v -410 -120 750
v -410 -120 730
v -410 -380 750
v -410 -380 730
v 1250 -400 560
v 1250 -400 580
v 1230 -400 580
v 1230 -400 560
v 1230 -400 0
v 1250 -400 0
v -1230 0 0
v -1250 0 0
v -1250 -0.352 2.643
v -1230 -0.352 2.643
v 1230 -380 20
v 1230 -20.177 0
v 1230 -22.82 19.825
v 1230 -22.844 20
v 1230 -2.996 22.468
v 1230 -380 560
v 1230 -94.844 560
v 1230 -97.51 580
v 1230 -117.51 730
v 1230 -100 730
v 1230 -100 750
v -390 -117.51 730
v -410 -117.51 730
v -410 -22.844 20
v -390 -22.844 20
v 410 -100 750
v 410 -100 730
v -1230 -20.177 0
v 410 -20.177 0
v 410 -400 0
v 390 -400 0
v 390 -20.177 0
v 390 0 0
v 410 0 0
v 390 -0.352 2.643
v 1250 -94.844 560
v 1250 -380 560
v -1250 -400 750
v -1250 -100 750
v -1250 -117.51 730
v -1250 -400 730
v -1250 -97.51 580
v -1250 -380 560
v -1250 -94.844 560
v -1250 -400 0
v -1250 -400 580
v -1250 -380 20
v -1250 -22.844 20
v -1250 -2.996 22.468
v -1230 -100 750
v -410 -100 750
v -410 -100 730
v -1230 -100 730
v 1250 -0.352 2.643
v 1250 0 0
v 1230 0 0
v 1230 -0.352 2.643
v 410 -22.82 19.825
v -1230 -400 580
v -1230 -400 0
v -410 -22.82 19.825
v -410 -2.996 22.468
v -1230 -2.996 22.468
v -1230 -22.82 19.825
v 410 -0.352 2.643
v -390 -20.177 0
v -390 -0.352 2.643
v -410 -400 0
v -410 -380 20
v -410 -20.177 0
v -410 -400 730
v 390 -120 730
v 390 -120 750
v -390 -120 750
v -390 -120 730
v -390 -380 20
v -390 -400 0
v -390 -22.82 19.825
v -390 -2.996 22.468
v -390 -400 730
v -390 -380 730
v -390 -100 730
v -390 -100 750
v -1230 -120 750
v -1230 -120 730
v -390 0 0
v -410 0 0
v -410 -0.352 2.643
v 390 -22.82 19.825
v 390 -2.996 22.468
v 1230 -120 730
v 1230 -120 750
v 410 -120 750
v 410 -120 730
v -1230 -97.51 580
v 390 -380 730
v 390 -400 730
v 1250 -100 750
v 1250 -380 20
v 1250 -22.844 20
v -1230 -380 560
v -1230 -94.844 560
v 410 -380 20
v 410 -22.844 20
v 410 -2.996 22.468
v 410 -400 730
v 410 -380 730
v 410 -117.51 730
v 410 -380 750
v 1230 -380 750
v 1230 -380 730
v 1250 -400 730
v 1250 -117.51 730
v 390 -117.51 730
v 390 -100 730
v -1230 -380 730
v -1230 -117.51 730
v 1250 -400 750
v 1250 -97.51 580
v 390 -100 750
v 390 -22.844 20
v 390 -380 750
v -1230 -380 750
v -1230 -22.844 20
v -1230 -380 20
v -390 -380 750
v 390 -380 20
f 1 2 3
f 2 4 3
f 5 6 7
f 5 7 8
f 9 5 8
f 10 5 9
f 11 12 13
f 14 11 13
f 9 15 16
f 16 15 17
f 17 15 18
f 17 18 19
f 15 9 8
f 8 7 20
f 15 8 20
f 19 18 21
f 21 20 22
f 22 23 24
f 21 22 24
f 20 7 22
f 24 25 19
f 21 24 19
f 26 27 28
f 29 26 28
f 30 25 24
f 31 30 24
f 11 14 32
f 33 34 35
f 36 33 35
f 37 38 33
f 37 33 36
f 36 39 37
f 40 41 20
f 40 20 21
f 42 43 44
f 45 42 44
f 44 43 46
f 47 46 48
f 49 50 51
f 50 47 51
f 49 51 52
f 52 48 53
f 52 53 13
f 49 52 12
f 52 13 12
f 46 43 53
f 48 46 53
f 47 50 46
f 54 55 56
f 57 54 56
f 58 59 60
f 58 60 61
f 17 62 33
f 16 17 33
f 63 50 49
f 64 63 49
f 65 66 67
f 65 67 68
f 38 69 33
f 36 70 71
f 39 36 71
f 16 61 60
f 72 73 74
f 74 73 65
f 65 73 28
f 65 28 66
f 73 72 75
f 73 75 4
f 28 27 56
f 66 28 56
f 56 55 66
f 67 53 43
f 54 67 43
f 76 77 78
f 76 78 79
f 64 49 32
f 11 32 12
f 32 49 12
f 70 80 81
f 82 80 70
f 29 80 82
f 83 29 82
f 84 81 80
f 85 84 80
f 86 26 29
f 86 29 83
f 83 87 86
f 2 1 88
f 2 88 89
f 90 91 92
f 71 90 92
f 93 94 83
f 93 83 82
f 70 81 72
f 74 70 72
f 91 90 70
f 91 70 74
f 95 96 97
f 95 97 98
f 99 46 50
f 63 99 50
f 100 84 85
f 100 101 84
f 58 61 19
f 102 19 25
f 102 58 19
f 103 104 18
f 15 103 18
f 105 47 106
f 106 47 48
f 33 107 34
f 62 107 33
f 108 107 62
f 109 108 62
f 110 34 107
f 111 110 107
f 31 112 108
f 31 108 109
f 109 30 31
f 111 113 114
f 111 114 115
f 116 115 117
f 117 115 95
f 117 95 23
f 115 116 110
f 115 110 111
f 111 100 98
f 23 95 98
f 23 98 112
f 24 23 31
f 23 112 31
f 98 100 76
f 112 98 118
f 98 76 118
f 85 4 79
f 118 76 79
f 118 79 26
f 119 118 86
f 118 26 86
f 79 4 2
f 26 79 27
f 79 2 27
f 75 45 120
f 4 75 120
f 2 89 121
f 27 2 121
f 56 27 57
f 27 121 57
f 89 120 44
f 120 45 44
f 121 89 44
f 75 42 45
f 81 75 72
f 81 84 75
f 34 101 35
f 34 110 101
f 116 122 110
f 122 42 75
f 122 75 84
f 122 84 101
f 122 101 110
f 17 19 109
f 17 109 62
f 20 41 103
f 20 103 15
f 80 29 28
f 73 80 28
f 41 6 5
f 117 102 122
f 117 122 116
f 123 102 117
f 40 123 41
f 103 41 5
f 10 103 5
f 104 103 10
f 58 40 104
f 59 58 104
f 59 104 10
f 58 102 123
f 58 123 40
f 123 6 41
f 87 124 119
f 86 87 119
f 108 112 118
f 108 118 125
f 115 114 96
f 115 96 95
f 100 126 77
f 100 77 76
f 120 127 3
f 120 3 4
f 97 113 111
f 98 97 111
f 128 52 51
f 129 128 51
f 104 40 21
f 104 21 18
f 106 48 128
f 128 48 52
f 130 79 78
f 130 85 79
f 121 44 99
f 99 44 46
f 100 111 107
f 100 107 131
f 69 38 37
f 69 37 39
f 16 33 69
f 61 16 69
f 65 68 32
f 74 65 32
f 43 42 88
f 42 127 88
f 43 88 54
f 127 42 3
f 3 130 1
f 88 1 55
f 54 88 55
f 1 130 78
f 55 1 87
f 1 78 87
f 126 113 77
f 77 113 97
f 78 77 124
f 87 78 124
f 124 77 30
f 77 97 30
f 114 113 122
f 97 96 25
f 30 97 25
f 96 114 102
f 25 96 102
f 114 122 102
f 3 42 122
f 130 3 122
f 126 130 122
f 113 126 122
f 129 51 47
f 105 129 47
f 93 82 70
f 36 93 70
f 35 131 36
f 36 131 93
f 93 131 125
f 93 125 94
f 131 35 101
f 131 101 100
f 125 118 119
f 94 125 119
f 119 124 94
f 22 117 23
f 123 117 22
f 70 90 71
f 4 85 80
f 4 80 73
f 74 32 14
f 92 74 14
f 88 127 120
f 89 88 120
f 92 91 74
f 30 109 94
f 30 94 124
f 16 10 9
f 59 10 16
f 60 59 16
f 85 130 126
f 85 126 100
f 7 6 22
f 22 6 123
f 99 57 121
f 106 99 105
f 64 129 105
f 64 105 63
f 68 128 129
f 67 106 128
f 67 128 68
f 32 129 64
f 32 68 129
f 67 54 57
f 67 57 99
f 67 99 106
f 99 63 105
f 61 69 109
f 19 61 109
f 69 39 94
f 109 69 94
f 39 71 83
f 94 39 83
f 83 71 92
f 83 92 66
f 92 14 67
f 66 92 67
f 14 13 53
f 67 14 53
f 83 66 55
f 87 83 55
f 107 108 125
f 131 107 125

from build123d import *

# Parameters (mm, degrees)
BOSS_EXTRUDE2_START  = 1250
BOSS_EXTRUDE2_DEPTH  = 20
SKETCH3_W            = 20
SKETCH3_H            = 20
BOSS_EXTRUDE3_DEPTH  = 1250
LPATTERN1_COUNT      = 2
LPATTERN1_PITCH      = 840
MIRROR1_START        = 1250
MIRROR1_COPY_1_DEPTH = 20
SKETCH6_W            = 20
SKETCH6_H            = 20
BOSS_EXTRUDE7_DEPTH  = 730
SKETCH7_W            = 20
SKETCH7_H            = 379.823005399
BOSS_EXTRUDE8_DEPTH  = 20
CUT_EXTRUDE2_DEPTH   = 20
SKETCH10_W           = 20
SKETCH10_H           = 305.156338733
BOSS_EXTRUDE9_DEPTH  = 20
SKETCH11_W           = 150
SKETCH11_H           = 20
CUT_EXTRUDE3_DEPTH   = 20
BOSS_EXTRUDE10_DEPTH = 20


with BuildPart() as part:
    # Sketch2 → Boss-Extrude2 (new body)
    with BuildSketch(Plane(origin=(0, 0, 0), x_dir=(0, 0, -1), z_dir=(1, 0, 0)).offset(BOSS_EXTRUDE2_START)):
        Polygon((-2.643274402, -0.352436587), (-750, -100), (-750, -400), (-730, -400), (-730, -117.510327934), (0, -20.176994601), (0, 0), align=None)
    boss_extrude2 = extrude(amount=-BOSS_EXTRUDE2_DEPTH)

    # Sketch3 → Boss-Extrude3 (add, symmetric)
    with BuildSketch(Plane(origin=(0, 0, 0), x_dir=(0, 0, -1), z_dir=(1, 0, 0))):
        Polygon((0, -20.176994601), (-2.643274402, -0.352436587), (-22.467832415, -2.995710989), (-19.824558014, -22.820269002), align=None)
        with Locations((-740, -390)):
            Rectangle(SKETCH3_W, SKETCH3_H)
        with Locations((-740, -110)):
            Rectangle(SKETCH3_W, SKETCH3_H)
    extrude(amount=BOSS_EXTRUDE3_DEPTH, both=True)

    # LPattern1: Boss-Extrude2 ×2
    with Locations(*[(-i * LPATTERN1_PITCH, 0, 0) for i in range(1, LPATTERN1_COUNT)]):
        add(boss_extrude2)

    # Mirror1: Boss-Extrude2 across plane
    add(boss_extrude2.mirror(Plane(origin=(0, 0, 0), x_dir=(0, 0, 1), z_dir=(1, 0, 0))))

    # Mirror1 copy 1 sketch → Mirror1 copy 1 (add)
    with BuildSketch(Plane(origin=(840, 0, 0), x_dir=(0, 0, -1), z_dir=(-1, 0, 0)).offset(MIRROR1_START)):
        Polygon((-2.643274402, 0.352436587), (-750, 100), (-750, 400), (-730, 400), (-730, 117.510327934), (0, 20.176994601), (0, 0), align=None)
    extrude(amount=-MIRROR1_COPY_1_DEPTH)

    # Sketch6 → Boss-Extrude7 (add, through all)
    with BuildSketch(Plane(origin=(0, 0, 730), x_dir=(-1, 0, 0), z_dir=(0, 0, -1))):
        with Locations((-400, -390)):
            Rectangle(SKETCH6_W, SKETCH6_H)
        with Locations((400, -390)):
            Rectangle(SKETCH6_W, SKETCH6_H)
        with Locations((-1240, -390)):
            Rectangle(SKETCH6_W, SKETCH6_H)
        with Locations((1240, -390)):
            Rectangle(SKETCH6_W, SKETCH6_H)
    extrude(amount=BOSS_EXTRUDE7_DEPTH)

    # Sketch7 → Boss-Extrude8 (add)
    with BuildSketch(Plane(origin=(0, 0, 0), x_dir=(-1, 0, 0), z_dir=(0, 0, -1))):
        with Locations((-1240, -210.0884973)):
            Rectangle(SKETCH7_W, SKETCH7_H)
        with Locations((-400, -210.0884973)):
            Rectangle(SKETCH7_W, SKETCH7_H)
        with Locations((400, -210.0884973)):
            Rectangle(SKETCH7_W, SKETCH7_H)
        with Locations((1240, -210.0884973)):
            Rectangle(SKETCH7_W, SKETCH7_H)
    extrude(amount=-BOSS_EXTRUDE8_DEPTH)

    # Sketch9 → Cut-Extrude2 (cut)
    with BuildSketch(Plane.ZY.offset(1250)):
        Polygon((0, -400), (730, -400), (730, -117.510327934), (20, -22.843661267), (0, -20.176994601), align=None)
    extrude(amount=-CUT_EXTRUDE2_DEPTH, mode=Mode.SUBTRACT)

    # Sketch10 → Boss-Extrude9 (add)
    with BuildSketch(Plane(origin=(1250, 0, 0), x_dir=(0, 0, -1), z_dir=(1, 0, 0))):
        with Locations((-570, -247.421830634)):
            Rectangle(SKETCH10_W, SKETCH10_H)
    extrude(amount=-BOSS_EXTRUDE9_DEPTH)

    # Sketch11 → Cut-Extrude3 (cut)
    with BuildSketch(Plane(origin=(1250, 0, 0), x_dir=(0, 0, -1), z_dir=(1, 0, 0))):
        with Locations((-655, -390)):
            Rectangle(SKETCH11_W, SKETCH11_H)
    extrude(amount=-CUT_EXTRUDE3_DEPTH, mode=Mode.SUBTRACT)

    # Sketch12 → Boss-Extrude10 (add)
    with BuildSketch(Plane.ZY.offset(1250)):
        Polygon((0, -20.176994601), (20, -20.176994601), (20, -380), (560, -380), (560, -94.843661267), (580, -94.843661267), (580, -400), (0, -400), align=None)
    extrude(amount=-BOSS_EXTRUDE10_DEPTH)


solid = part.part
